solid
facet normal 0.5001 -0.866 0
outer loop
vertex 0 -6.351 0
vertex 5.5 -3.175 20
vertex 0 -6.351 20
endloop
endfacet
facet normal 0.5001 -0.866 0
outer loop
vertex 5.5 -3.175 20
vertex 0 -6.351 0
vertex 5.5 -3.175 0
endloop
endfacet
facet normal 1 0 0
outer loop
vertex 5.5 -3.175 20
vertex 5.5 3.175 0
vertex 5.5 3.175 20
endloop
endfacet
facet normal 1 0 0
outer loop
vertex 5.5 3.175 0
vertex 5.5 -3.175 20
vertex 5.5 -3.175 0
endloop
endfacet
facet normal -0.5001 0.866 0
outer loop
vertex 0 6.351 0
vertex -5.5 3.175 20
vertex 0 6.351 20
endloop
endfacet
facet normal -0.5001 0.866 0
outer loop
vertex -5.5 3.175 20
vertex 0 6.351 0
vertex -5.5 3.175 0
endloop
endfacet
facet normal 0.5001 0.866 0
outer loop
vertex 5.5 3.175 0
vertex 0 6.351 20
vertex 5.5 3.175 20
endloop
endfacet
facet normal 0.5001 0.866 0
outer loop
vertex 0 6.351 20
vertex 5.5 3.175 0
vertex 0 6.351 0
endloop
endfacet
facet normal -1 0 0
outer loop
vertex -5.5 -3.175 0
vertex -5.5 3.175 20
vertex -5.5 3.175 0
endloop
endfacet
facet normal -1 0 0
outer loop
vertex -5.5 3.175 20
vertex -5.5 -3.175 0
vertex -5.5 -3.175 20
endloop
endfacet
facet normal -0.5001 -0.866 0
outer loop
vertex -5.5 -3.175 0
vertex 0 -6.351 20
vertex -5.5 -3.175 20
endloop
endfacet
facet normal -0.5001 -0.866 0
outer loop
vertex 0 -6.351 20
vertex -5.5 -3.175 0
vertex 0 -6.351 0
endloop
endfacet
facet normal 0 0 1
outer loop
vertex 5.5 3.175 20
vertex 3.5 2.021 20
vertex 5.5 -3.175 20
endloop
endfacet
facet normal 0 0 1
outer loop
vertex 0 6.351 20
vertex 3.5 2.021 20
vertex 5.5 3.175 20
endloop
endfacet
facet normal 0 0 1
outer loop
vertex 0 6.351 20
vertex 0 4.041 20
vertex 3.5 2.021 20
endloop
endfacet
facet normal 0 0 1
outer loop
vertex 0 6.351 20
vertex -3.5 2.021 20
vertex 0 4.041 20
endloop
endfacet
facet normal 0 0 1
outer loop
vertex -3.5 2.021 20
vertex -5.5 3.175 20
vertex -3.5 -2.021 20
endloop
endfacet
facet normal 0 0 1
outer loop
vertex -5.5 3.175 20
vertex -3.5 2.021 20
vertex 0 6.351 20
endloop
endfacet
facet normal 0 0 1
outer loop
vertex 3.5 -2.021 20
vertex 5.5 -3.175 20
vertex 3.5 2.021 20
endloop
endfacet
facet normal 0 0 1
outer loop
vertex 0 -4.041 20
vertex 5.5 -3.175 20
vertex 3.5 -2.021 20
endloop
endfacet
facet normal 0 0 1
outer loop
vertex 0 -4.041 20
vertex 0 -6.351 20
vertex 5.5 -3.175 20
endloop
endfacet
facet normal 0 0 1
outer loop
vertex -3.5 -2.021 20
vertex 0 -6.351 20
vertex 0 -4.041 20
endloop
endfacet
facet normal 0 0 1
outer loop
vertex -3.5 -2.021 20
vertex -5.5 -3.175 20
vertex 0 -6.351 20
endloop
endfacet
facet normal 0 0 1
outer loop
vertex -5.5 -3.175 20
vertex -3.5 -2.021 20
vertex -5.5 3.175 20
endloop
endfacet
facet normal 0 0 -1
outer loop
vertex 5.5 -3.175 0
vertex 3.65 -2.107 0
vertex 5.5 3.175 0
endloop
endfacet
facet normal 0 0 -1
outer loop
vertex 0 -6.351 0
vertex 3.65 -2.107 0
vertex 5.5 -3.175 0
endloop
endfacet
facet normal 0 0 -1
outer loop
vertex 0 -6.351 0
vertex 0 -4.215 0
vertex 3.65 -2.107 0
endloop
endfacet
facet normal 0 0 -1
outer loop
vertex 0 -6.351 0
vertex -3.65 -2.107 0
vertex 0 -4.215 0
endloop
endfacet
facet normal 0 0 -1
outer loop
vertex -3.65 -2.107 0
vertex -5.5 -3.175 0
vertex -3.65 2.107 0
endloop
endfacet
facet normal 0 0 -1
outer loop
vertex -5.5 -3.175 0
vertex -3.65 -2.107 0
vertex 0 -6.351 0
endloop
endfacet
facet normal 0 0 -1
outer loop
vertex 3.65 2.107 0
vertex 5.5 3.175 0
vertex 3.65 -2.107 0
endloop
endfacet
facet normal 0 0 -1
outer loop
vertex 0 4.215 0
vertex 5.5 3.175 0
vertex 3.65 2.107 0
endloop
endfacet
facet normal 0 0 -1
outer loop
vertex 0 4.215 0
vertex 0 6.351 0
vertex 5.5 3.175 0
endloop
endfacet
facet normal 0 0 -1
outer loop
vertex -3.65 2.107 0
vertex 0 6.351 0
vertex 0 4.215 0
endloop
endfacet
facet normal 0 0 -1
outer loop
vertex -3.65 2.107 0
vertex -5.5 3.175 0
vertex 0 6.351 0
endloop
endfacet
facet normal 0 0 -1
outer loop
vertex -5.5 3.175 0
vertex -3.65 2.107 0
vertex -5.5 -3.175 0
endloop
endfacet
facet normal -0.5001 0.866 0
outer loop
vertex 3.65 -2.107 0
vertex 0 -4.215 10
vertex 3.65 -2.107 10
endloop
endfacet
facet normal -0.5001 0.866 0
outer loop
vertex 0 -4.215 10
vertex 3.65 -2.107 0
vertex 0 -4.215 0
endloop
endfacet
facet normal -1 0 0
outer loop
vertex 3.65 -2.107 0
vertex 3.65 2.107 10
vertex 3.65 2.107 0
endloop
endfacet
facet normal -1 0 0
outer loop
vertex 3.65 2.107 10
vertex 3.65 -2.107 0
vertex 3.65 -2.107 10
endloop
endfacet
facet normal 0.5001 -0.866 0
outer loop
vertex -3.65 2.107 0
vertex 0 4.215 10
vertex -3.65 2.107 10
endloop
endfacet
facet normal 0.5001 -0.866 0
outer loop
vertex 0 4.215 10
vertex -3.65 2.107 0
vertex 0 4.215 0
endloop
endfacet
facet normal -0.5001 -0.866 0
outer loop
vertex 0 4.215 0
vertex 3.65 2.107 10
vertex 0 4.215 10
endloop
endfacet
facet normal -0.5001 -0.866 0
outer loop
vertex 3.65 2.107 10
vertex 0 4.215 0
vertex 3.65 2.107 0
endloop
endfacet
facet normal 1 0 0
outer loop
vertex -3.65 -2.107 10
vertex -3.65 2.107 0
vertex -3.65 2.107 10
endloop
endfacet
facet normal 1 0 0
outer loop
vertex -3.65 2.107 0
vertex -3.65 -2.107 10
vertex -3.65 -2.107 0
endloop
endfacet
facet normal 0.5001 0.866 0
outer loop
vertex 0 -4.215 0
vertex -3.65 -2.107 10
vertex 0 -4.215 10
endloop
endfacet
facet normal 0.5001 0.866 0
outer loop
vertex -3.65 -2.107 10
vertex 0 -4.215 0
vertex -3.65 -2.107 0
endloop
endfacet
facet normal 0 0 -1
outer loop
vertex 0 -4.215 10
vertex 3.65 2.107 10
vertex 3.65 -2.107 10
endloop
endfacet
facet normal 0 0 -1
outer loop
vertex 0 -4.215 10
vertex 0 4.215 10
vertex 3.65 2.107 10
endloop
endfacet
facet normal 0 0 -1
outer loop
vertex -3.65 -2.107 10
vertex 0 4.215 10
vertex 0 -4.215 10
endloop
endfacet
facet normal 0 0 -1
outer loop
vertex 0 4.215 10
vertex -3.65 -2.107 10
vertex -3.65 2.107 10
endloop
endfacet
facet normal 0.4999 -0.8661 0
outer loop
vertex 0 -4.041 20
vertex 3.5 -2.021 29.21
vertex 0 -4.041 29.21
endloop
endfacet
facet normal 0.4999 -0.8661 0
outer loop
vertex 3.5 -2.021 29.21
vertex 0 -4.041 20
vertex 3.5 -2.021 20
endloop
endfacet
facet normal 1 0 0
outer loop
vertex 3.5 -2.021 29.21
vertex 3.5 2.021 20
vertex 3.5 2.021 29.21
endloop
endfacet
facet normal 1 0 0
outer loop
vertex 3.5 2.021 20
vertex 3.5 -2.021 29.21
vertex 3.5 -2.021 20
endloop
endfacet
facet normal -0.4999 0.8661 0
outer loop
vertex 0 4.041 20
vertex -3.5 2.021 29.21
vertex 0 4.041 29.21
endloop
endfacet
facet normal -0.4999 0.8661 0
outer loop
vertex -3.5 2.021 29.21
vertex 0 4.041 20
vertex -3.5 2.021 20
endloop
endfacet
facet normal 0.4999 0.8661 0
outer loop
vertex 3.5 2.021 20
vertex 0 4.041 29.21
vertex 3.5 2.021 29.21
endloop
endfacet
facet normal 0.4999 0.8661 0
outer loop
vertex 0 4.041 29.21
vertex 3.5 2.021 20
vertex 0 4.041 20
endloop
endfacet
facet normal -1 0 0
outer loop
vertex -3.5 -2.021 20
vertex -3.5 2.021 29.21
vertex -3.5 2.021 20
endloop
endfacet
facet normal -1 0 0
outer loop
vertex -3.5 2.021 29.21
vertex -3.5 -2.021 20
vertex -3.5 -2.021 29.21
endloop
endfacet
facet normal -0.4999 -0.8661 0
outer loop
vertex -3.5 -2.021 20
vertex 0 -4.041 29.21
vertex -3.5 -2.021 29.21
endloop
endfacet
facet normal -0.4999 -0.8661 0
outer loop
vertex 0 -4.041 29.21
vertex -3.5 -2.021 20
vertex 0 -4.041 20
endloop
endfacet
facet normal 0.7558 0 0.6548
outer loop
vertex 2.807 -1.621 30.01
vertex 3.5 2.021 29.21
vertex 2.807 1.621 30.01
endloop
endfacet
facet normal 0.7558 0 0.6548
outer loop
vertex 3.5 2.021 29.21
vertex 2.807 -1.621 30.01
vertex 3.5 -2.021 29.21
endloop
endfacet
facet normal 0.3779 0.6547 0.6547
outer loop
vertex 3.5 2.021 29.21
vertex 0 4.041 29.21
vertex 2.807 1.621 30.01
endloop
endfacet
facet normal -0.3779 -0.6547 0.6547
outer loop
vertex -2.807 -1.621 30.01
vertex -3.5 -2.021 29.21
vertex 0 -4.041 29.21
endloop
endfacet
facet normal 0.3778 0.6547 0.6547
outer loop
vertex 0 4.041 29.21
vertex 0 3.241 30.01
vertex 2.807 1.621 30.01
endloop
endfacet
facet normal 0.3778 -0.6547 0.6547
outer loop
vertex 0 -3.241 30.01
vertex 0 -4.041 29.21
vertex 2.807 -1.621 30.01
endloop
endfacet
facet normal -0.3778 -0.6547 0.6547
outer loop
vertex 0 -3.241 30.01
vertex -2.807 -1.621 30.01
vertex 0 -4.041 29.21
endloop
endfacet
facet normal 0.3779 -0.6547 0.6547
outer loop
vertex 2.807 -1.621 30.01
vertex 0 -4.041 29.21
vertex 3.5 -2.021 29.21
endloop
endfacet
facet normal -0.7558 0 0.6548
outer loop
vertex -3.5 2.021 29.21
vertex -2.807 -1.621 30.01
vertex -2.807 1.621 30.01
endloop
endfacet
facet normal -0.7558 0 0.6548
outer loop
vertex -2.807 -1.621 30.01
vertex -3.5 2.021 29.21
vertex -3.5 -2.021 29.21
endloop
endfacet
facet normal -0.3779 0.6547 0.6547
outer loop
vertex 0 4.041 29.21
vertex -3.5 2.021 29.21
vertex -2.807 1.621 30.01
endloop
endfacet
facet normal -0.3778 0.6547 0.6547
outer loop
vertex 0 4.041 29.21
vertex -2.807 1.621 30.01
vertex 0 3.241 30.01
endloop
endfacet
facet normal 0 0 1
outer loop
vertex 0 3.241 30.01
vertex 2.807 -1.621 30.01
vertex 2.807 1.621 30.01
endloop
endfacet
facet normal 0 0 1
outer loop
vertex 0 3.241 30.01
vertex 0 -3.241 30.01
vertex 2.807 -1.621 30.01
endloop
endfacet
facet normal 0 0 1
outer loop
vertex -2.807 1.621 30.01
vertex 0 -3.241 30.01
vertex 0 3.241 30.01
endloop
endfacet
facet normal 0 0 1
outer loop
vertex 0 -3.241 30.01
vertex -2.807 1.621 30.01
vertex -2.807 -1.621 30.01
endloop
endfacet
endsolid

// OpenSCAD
// file: _hex_connector.scad
// =====================================
// Hex Connector Library
// Single-piece connector — 7mm across-flats
// Female socket (10mm deep) at bottom, male protrusion (10mm) at top
// Total height: 30mm (20mm body + 10mm protrusion)
// =====================================

// === Parameters (mm) ===
hex_af       = 7.0;   // across-flats of socket and protrusion
wall         = 2;     // wall thickness around female socket
total_height = 20;    // outer body height
socket_depth = 10;    // female socket depth = male protrusion height
clearance    = 0.3;   // diametral fit clearance (0.15mm per side)
tip_bevel    = 0.8;   // taper height at male protrusion tip for insertion guide
bevel_radial = 0.8;   // circumradius reduction at protrusion tip

// Derived
outer_af = hex_af + 2 * wall;                        // 11.0mm
hex_r    = hex_af              / (2 * cos(30));      // circumradius for 7mm af
outer_r  = outer_af            / (2 * cos(30));      // circumradius for 11mm af
socket_r = (hex_af + clearance) / (2 * cos(30));     // socket circumradius with clearance
bevel_r  = hex_r - bevel_radial;                     // reduced circumradius at protrusion tip

// === Modules ===
module hex_prism(r, h) {
    rotate([0, 0, 30])
        cylinder(r = r, h = h, $fn = 6);
}

module hex_connector() {
    union() {
        difference() {
            hex_prism(outer_r, total_height);
            translate([0, 0, -0.01])
                hex_prism(socket_r, socket_depth + 0.01);
        }
        translate([0, 0, total_height]) {
            hex_prism(hex_r, socket_depth - tip_bevel);
            translate([0, 0, socket_depth - tip_bevel])
                hull() {
                    rotate([0, 0, 30]) cylinder(r = hex_r,   h = 0.01, $fn = 6);
                    translate([0, 0, tip_bevel])
                        rotate([0, 0, 30]) cylinder(r = bevel_r, h = 0.01, $fn = 6);
                }
        }
    }
}
// main file
// =====================================
// Hex Connector — Single Piece
// Female socket at bottom (7mm af, 10mm deep), male protrusion at top (7mm af, 10mm).
// Print protrusion-up — no supports needed.
// =====================================

include <_hex_connector.scad>

hex_connector();
